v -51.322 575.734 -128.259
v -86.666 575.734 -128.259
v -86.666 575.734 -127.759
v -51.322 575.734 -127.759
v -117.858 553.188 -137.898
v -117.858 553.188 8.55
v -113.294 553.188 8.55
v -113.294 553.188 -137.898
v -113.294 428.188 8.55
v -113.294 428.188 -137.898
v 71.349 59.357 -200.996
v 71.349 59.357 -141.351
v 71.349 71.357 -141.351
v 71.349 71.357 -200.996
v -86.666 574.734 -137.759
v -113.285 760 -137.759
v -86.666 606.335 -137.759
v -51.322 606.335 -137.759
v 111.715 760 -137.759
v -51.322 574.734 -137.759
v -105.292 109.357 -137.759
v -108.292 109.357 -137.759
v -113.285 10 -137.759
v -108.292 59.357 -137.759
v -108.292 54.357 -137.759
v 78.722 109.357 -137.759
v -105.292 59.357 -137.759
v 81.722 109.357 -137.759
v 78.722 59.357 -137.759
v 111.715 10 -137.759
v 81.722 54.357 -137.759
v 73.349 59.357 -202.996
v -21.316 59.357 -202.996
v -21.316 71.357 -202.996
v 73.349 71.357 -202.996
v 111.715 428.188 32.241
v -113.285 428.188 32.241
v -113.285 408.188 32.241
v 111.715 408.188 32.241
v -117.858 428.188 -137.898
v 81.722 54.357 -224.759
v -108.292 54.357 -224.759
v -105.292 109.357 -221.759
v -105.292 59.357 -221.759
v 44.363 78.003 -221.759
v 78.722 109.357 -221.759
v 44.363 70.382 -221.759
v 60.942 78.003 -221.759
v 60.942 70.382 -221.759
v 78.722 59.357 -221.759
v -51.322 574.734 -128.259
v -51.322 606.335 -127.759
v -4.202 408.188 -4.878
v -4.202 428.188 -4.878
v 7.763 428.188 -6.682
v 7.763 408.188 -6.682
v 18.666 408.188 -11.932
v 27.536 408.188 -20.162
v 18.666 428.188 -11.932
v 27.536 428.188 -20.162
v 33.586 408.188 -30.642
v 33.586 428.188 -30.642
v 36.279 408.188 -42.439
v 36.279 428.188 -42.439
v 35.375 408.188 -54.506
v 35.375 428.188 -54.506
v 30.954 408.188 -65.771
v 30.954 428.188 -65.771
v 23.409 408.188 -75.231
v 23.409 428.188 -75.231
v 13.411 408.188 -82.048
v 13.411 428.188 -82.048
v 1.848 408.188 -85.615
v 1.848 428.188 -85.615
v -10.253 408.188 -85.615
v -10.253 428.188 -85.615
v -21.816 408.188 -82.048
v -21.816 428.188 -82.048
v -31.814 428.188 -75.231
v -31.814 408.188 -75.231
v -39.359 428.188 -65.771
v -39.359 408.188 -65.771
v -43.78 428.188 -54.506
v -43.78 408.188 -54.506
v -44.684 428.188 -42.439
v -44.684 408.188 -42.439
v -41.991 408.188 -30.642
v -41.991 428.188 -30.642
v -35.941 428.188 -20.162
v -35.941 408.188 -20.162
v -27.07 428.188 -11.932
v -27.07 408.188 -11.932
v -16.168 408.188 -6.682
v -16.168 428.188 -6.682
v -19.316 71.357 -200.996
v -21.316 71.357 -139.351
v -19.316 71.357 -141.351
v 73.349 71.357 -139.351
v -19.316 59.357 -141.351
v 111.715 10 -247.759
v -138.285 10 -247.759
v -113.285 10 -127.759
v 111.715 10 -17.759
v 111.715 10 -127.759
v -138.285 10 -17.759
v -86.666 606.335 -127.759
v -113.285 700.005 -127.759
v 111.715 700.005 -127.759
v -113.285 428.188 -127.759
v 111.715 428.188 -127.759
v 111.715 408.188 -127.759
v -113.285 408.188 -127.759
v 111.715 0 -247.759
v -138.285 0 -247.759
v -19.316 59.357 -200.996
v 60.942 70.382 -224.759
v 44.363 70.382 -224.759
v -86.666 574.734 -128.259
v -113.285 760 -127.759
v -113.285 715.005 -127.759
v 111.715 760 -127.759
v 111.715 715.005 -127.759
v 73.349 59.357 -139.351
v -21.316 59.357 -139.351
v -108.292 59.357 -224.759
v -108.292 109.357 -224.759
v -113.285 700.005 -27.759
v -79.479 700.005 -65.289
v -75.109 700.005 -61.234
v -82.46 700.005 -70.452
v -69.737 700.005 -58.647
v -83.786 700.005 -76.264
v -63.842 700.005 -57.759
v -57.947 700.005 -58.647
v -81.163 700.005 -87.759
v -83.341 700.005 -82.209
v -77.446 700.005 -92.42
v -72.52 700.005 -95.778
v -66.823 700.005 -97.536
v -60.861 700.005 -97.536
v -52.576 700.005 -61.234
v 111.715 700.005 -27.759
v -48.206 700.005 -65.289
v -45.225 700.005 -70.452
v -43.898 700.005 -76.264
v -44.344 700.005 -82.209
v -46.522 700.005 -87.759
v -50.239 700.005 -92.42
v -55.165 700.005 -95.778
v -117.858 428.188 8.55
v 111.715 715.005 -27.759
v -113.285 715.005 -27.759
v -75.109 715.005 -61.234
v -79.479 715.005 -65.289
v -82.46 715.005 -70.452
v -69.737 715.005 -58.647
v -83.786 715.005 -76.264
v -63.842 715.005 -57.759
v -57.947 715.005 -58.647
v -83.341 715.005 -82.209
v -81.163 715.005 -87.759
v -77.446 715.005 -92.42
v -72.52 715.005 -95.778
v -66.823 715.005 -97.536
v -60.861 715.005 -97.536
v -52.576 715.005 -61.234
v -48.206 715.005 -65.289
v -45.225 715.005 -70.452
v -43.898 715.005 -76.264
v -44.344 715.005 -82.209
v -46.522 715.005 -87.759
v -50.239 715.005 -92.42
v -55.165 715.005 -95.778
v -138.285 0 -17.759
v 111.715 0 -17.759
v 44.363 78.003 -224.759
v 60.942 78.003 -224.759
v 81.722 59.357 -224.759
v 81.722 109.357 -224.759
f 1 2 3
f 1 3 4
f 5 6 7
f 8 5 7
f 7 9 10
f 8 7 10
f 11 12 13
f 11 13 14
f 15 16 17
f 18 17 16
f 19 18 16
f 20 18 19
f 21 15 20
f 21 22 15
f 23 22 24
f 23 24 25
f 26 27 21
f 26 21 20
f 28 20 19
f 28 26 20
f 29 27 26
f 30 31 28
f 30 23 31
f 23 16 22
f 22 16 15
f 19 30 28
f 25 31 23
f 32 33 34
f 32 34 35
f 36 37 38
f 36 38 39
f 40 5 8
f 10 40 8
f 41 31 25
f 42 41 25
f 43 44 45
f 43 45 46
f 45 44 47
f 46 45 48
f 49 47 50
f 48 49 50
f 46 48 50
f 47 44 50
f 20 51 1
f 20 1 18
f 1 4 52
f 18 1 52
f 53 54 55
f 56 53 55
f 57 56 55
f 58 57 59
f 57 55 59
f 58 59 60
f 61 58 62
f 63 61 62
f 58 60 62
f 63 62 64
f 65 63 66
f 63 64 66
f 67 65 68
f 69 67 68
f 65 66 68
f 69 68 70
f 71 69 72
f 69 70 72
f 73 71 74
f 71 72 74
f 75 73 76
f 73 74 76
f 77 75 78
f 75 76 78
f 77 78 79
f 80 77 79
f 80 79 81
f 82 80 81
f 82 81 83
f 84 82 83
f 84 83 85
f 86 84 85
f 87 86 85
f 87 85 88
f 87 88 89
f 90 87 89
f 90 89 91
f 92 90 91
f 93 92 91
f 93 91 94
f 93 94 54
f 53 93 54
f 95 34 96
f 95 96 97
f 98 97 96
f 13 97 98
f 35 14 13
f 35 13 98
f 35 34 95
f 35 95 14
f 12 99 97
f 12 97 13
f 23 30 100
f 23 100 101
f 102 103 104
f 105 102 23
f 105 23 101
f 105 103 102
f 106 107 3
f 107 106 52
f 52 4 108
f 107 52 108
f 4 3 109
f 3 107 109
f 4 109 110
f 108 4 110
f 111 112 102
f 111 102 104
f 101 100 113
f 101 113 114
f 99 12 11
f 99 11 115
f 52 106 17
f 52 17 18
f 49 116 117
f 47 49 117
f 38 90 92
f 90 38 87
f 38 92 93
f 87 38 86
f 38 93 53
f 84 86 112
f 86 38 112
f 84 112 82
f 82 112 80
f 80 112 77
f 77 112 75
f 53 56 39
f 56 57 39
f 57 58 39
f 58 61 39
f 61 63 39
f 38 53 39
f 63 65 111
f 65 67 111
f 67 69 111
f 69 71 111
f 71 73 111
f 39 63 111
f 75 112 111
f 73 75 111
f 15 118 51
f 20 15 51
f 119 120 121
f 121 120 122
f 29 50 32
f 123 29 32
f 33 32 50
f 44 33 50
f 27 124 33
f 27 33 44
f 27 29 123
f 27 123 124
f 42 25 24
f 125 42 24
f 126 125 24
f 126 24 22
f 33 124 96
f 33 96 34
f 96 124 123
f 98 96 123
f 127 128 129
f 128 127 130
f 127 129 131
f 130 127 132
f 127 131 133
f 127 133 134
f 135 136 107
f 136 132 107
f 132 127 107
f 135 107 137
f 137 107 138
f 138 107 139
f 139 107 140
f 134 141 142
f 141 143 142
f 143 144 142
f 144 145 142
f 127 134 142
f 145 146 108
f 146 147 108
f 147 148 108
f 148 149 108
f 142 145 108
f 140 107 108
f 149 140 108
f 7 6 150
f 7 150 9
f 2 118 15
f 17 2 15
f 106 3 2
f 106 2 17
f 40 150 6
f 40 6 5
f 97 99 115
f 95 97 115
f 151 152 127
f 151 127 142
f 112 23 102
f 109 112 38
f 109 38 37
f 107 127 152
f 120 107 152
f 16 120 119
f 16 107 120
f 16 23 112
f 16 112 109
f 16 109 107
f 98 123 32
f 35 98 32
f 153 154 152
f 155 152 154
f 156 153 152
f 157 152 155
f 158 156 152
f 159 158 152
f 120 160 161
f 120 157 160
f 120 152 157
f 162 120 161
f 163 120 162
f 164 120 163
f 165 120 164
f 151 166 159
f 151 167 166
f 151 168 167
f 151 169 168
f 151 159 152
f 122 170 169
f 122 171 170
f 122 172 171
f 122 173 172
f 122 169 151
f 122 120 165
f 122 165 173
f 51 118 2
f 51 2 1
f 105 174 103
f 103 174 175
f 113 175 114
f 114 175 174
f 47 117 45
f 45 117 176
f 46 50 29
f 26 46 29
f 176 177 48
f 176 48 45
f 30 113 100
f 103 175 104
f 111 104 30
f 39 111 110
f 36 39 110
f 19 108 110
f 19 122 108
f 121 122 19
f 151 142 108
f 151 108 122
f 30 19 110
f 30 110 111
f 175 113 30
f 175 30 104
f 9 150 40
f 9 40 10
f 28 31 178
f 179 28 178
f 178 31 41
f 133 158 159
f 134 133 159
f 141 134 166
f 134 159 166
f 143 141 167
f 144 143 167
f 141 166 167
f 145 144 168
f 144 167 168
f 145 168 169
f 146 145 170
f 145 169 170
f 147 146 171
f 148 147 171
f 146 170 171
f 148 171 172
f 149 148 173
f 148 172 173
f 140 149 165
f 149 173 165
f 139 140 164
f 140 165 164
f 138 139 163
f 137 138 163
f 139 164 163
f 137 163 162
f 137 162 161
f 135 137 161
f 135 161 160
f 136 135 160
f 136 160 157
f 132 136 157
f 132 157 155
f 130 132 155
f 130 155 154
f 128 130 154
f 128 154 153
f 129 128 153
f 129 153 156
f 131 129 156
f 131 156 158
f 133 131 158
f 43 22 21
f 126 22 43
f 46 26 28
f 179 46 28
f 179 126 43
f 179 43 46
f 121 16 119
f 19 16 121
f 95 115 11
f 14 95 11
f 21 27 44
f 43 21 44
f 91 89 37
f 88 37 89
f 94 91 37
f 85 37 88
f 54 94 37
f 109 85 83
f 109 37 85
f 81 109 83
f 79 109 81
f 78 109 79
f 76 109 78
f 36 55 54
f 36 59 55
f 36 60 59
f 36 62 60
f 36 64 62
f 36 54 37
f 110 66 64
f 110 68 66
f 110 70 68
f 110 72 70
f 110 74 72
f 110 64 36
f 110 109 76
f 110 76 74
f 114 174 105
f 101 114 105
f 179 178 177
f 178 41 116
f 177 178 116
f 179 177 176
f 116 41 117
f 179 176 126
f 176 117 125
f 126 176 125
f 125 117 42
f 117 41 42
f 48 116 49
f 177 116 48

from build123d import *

# Parameters (mm, degrees)
CROQUIS1_W               = 250
CROQUIS1_H               = 120
SALIENTE_EXTRUIR1_DEPTH  = 10
CROQUIS2_W               = 250
CROQUIS2_H               = 10
SALIENTE_EXTRUIR2_DEPTH  = 750
CROQUIS3_W               = 190.013667147
CROQUIS3_H               = 5
SALIENTE_EXTRUIR3_DEPTH  = 87
CROQUIS4_W               = 94.664916229
CROQUIS4_H               = 63.645151041
CROQUIS4_W_2             = 90.664916229
CROQUIS4_H_2             = 59.645151041
SALIENTE_EXTRUIR4_DEPTH  = 12
SALIENTE_EXTRUIR5_DEPTH  = 50
CROQUIS6_W               = 16.579373852
CROQUIS6_H               = 7.621070837
CORTAR_EXTRUIR1_DEPTH    = 12
CROQUIS7_W               = 35.343962836
CROQUIS7_H               = 31.601732656
CORTAR_EXTRUIR2_DEPTH    = 12
CROQUIS8_W               = 35.343962836
CROQUIS8_H               = 0.5
SALIENTE_EXTRUIR6_DEPTH  = 1
CROQUIS9_W               = 17.06802825
CROQUIS9_H               = 0.5
SALIENTE_EXTRUIR7_DEPTH  = 1
CROQUIS10_W              = 250
CROQUIS10_H              = 10
SALIENTE_EXTRUIR8_DEPTH  = 110
CROQUIS11_W              = 250
CROQUIS11_H              = 15
SALIENTE_EXTRUIR9_DEPTH  = 100
CROQUIS12_R              = 20
CORTAR_EXTRUIR3_DEPTH    = 100
CROQUIS13_W              = 250
CROQUIS13_H              = 20
SALIENTE_EXTRUIR10_DEPTH = 160
CROQUIS14_R              = 40.595017514
CORTAR_EXTRUIR4_DEPTH    = 160
CROQUIS15_W              = 25
CROQUIS15_H              = 750
CORTAR_EXTRUIR5_DEPTH    = 791.963153623
CROQUIS16_W              = 4.56451145
CROQUIS16_H              = 146.448080862
SALIENTE_EXTRUIR11_DEPTH = 125


with BuildPart() as part:
    # Croquis1 → Saliente-Extruir1 (new body)
    with BuildSketch(Plane(origin=(0, 0, 0), x_dir=(1, 0, 0), z_dir=(0, 1, 0))):
        with Locations((-13.284888509, 77.758926711)):
            Rectangle(CROQUIS1_W, CROQUIS1_H)
    extrude(amount=SALIENTE_EXTRUIR1_DEPTH)

    # Croquis2 → Saliente-Extruir2 (add)
    with BuildSketch(Plane(origin=(0, 10, 0), x_dir=(1, 0, 0), z_dir=(0, 1, 0))):
        with Locations((-13.284888509, 132.758926711)):
            Rectangle(CROQUIS2_W, CROQUIS2_H)
    extrude(amount=SALIENTE_EXTRUIR2_DEPTH)

    # Croquis3 → Saliente-Extruir3 (add)
    with BuildSketch(Plane(origin=(0, 0, -137.758926711), x_dir=(-1, 0, 0), z_dir=(0, 0, -1))):
        with Locations((13.284888509, 56.856532068)):
            Rectangle(CROQUIS3_W, CROQUIS3_H)
    extrude(amount=SALIENTE_EXTRUIR3_DEPTH)

    # Croquis4 → Saliente-Extruir4 (add)
    with BuildSketch(Plane(origin=(0, 59.356532068, 0), x_dir=(1, 0, 0), z_dir=(0, 1, 0))):
        with Locations((26.01643171, 171.173921802)):
            Rectangle(CROQUIS4_W, CROQUIS4_H)
        with Locations((26.01643171, 171.173921802)):
            Rectangle(CROQUIS4_W_2, CROQUIS4_H_2, mode=Mode.SUBTRACT)
    extrude(amount=SALIENTE_EXTRUIR4_DEPTH)

    # Croquis5 → Saliente-Extruir5 (add)
    with BuildSketch(Plane(origin=(0, 59.356532068, 0), x_dir=(1, 0, 0), z_dir=(0, 1, 0))):
        Polygon((78.721945065, 137.758926711), (81.721945065, 137.758926711), (81.721945065, 224.758926711), (-108.291722082, 224.758926711), (-108.291722082, 137.758926711), (-105.291722082, 137.758926711), (-105.291722082, 141.512872832), (-105.291722082, 221.758926711), (78.721945065, 221.758926711), (78.721945065, 141.512872832), align=None)
    extrude(amount=SALIENTE_EXTRUIR5_DEPTH)

    # Croquis6 → Cortar-Extruir1 (cut)
    with BuildSketch(Plane(origin=(0, 0, -224.758926711), x_dir=(-1, 0, 0), z_dir=(0, 0, -1))):
        with Locations((-52.652753503, 74.192072615)):
            Rectangle(CROQUIS6_W, CROQUIS6_H)
    extrude(amount=-CORTAR_EXTRUIR1_DEPTH, mode=Mode.SUBTRACT)

    # Croquis7 → Cortar-Extruir2 (cut)
    with BuildSketch(Plane.XY.offset(-127.758926711)):
        with Locations((-68.994259572, 590.534379378)):
            Rectangle(CROQUIS7_W, CROQUIS7_H)
    extrude(amount=-CORTAR_EXTRUIR2_DEPTH, mode=Mode.SUBTRACT)

    # Croquis8 → Saliente-Extruir6 (add)
    with BuildSketch(Plane(origin=(0, 574.73351305, 0), x_dir=(1, 0, 0), z_dir=(0, 1, 0))):
        with Locations((-68.994259572, 128.008926711)):
            Rectangle(CROQUIS8_W, CROQUIS8_H)
    extrude(amount=SALIENTE_EXTRUIR6_DEPTH)

    # Croquis9 → Saliente-Extruir7 (add)
    with BuildSketch(Plane.XZ.offset(-606.335245706)):
        with Locations((-42.788264029, -128.008926711)):
            Rectangle(CROQUIS9_W, CROQUIS9_H)
    extrude(amount=SALIENTE_EXTRUIR7_DEPTH)

    # Croquis10 → Saliente-Extruir8 (add)
    with BuildSketch(Plane(origin=(0, 0, -137.758926711), x_dir=(-1, 0, 0), z_dir=(0, 0, -1))):
        with Locations((13.284888509, 5)):
            Rectangle(CROQUIS10_W, CROQUIS10_H)
    extrude(amount=SALIENTE_EXTRUIR8_DEPTH)

    # Croquis11 → Saliente-Extruir9 (add)
    with BuildSketch(Plane.XY.offset(-127.758926711)):
        with Locations((-13.284888509, 707.504842282)):
            Rectangle(CROQUIS11_W, CROQUIS11_H)
    extrude(amount=SALIENTE_EXTRUIR9_DEPTH)

    # Croquis12 → Cortar-Extruir3 (cut)
    with BuildSketch(Plane(origin=(0, 715.004842282, 0), x_dir=(1, 0, 0), z_dir=(0, 1, 0))):
        with Locations(Location((-63.842303926, 77.758926711, 0), (0, 0, 270))):
            Circle(CROQUIS12_R)
    extrude(amount=-CORTAR_EXTRUIR3_DEPTH, mode=Mode.SUBTRACT)

    # Croquis13 → Saliente-Extruir10 (add)
    with BuildSketch(Plane.XY.offset(-127.758926711)):
        with Locations((-13.284888509, 418.188422717)):
            Rectangle(CROQUIS13_W, CROQUIS13_H)
    extrude(amount=SALIENTE_EXTRUIR10_DEPTH)

    # Croquis14 → Cortar-Extruir4 (cut)
    with BuildSketch(Plane(origin=(0, 428.188422717, 0), x_dir=(1, 0, 0), z_dir=(0, 1, 0))):
        with Locations(Location((-4.202382173, 45.473050992, 0), (0, 0, 270))):
            Circle(CROQUIS14_R)
    extrude(amount=-CORTAR_EXTRUIR4_DEPTH, mode=Mode.SUBTRACT)

    # Croquis15 → Cortar-Extruir5 (cut, through all)
    with BuildSketch(Plane(origin=(0, 0, -137.758926711), x_dir=(-1, 0, 0), z_dir=(0, 0, -1))):
        with Locations((125.784888509, 385)):
            Rectangle(CROQUIS15_W, CROQUIS15_H)
    extrude(amount=-CORTAR_EXTRUIR5_DEPTH, mode=Mode.SUBTRACT)


with BuildPart() as body_2:
    # Croquis16 → Saliente-Extruir11 (new body)
    with BuildSketch(Plane(origin=(0, 428.188422717, 0), x_dir=(1, 0, 0), z_dir=(0, 1, 0))):
        with Locations((-115.576174025, 64.674173371)):
            Rectangle(CROQUIS16_W, CROQUIS16_H)
    extrude(amount=SALIENTE_EXTRUIR11_DEPTH)


solid = Compound([part.part, body_2.part])
